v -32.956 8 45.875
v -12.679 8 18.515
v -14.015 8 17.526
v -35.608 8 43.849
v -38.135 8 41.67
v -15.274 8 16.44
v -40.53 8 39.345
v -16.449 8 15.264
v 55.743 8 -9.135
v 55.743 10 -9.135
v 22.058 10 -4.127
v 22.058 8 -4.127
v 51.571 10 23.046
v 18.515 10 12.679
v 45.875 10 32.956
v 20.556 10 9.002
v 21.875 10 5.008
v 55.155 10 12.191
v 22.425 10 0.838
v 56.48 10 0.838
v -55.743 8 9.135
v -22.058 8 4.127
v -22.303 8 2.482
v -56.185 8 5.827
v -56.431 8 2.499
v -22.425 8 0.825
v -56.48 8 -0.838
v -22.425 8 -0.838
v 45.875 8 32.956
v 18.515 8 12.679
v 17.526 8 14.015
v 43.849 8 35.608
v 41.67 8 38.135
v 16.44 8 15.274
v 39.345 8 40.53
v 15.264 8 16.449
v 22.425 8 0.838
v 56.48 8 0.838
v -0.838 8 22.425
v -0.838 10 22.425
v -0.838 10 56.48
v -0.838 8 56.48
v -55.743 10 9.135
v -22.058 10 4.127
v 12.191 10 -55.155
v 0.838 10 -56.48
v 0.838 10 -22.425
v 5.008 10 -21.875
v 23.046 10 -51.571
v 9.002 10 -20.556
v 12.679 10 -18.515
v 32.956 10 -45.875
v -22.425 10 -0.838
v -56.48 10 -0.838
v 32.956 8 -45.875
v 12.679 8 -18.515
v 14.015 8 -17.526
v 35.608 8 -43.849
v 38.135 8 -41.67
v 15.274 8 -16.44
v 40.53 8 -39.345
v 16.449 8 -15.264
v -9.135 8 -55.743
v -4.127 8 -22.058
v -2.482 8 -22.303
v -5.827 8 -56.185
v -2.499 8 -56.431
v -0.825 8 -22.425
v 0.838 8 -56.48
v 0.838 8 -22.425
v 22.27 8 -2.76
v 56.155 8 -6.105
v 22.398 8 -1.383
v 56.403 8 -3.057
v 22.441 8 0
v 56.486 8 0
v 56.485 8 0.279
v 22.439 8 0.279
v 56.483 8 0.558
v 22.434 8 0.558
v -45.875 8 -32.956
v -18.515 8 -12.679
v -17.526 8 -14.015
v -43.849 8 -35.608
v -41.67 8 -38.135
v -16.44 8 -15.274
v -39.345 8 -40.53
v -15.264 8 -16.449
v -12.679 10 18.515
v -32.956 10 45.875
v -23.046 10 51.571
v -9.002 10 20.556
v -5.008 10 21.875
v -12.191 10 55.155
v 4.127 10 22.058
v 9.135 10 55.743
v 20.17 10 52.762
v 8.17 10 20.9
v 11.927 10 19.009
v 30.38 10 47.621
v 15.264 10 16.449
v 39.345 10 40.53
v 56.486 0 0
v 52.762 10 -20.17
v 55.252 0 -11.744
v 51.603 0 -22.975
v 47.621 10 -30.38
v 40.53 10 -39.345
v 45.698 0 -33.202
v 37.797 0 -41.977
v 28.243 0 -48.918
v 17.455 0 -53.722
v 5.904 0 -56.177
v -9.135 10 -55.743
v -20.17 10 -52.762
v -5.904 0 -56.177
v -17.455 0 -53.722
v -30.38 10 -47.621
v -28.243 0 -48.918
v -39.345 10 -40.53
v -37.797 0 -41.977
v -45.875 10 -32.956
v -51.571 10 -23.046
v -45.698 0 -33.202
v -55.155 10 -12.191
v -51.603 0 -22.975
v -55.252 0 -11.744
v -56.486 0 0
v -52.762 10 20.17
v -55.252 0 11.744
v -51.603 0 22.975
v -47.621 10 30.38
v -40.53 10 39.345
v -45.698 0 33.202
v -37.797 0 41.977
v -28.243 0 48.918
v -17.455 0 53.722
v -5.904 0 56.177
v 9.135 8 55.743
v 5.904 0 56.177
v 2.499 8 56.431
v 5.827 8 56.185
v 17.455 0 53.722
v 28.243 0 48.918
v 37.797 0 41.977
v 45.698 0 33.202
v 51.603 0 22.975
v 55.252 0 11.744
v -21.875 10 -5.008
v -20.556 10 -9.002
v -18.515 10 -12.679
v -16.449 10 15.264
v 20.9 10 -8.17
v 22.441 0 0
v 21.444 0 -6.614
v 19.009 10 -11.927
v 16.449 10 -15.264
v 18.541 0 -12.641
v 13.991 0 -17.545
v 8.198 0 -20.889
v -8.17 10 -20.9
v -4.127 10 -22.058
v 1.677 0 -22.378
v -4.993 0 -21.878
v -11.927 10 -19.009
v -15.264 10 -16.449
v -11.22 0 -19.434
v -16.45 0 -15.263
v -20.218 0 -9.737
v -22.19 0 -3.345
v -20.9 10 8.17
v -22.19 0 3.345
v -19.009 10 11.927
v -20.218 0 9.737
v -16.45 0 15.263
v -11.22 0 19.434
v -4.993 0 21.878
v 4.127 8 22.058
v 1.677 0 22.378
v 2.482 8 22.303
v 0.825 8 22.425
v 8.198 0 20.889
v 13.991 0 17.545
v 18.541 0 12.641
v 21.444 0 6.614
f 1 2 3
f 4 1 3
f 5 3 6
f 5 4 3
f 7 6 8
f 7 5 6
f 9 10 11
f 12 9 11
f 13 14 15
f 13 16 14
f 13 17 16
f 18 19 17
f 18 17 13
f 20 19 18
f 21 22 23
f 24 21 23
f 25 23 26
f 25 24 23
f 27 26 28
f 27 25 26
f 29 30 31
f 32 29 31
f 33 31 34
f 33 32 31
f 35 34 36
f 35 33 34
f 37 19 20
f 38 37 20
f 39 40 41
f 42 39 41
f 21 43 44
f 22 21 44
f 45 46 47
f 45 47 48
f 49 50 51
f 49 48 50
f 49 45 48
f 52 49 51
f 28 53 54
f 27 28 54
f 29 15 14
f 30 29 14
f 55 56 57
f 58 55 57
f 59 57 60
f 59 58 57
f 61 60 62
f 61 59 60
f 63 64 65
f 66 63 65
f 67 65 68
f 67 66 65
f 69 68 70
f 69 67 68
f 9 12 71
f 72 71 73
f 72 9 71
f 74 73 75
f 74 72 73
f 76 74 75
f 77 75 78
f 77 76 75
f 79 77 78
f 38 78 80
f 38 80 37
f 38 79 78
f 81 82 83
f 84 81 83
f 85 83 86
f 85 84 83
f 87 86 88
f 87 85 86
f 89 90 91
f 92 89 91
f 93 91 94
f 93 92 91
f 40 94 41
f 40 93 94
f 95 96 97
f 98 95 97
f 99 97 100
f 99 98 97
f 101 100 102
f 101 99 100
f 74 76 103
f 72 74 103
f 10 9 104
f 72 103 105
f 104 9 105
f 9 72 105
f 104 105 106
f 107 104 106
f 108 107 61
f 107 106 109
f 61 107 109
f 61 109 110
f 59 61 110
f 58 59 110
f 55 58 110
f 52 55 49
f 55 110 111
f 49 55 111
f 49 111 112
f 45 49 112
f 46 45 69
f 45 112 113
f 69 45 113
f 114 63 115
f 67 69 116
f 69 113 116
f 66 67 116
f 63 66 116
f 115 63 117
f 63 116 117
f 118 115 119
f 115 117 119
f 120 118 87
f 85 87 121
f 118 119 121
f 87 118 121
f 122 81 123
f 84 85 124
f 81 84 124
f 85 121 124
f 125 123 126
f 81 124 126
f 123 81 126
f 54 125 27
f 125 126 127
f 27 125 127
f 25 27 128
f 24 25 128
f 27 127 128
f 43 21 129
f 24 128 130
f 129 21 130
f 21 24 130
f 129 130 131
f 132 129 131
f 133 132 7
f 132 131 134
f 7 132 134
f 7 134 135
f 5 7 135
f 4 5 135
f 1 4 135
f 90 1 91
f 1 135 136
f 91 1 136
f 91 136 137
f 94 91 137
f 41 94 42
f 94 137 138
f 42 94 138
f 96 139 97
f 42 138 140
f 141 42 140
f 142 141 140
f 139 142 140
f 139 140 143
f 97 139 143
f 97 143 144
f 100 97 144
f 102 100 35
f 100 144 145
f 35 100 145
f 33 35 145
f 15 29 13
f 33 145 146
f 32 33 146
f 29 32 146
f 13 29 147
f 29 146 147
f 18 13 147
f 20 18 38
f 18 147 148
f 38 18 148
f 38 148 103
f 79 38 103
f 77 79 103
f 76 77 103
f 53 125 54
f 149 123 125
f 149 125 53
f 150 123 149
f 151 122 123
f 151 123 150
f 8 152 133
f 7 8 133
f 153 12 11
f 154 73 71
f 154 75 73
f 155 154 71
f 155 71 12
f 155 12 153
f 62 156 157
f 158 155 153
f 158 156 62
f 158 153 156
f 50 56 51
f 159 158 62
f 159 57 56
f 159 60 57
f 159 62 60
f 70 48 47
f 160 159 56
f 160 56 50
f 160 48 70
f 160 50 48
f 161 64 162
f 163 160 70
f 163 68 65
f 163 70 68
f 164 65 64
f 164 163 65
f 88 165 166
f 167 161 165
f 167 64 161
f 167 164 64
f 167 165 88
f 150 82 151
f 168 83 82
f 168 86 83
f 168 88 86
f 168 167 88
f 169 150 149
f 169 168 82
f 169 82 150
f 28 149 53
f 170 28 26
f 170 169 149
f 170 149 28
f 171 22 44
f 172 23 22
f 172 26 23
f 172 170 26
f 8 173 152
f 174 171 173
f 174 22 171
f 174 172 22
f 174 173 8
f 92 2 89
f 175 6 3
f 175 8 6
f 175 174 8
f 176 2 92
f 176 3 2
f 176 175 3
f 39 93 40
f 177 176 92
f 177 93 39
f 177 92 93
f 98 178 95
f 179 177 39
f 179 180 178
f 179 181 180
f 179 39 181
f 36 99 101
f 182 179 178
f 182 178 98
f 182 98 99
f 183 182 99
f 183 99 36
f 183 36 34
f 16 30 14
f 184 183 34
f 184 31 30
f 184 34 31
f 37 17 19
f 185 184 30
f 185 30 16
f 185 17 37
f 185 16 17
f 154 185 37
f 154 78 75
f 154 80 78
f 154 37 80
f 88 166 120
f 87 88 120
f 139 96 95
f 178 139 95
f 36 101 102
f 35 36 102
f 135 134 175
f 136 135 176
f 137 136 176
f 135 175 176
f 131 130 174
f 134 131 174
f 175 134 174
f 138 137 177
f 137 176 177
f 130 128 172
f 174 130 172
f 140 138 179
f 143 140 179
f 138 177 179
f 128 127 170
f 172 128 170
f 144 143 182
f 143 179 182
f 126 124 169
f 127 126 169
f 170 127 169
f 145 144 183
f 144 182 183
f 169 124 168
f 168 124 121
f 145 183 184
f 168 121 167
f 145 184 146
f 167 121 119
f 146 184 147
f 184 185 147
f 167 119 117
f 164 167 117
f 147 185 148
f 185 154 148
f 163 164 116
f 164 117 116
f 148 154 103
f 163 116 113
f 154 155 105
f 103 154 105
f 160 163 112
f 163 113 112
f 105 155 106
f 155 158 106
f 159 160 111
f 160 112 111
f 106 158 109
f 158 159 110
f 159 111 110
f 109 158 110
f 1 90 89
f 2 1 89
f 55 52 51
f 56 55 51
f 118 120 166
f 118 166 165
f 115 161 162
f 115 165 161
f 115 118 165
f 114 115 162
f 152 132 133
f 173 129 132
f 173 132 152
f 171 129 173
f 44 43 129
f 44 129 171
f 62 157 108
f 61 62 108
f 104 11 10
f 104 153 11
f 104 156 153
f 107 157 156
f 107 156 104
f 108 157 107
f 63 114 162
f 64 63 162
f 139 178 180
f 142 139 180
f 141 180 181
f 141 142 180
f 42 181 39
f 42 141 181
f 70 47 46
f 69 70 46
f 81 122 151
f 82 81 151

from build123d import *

# Parameters (mm, degrees)
SKETCH1_R           = 56.486183981
SKETCH1_R_2         = 22.440533472
BOSS_EXTRUDE1_DEPTH = 10
CUT_EXTRUDE1_DEPTH  = 2
CIRPATTERN1_COUNT   = 8


with BuildPart() as part:
    # Sketch1 → Boss-Extrude1 (new body)
    with BuildSketch(Plane(origin=(0, 0, 0), x_dir=(1, 0, 0), z_dir=(0, 1, 0))):
        Circle(SKETCH1_R)
        Circle(SKETCH1_R_2, mode=Mode.SUBTRACT)
    extrude(amount=BOSS_EXTRUDE1_DEPTH)

    # Sketch2 → Cut-Extrude1 (cut)
    with BuildSketch(Plane(origin=(0, 10, 0), x_dir=(1, 0, 0), z_dir=(0, 1, 0))):
        with BuildLine():
            Line((-9.135137375, 55.742607096), (-1.420081042, 3.855253414))
            ThreePointArc((-1.420081042, 3.855253414), (-0.302945279, 4.097295841), (0.837640155, 4.022184484))
            Line((0.837640155, 4.022184484), (0.837640155, 56.479972908))
            ThreePointArc((0.837640155, 56.479972908), (-4.165098092, 56.332414635), (-9.135137375, 55.742607096))
        make_face()
    cut_extrude1 = extrude(amount=-CUT_EXTRUDE1_DEPTH, mode=Mode.SUBTRACT)

    # CirPattern1: Cut-Extrude1 ×8 about axis
    cirpattern1_axis = Axis((0, 0, 0), (0, 1, 0))
    for i in range(1, CIRPATTERN1_COUNT):
        add(cut_extrude1.rotate(cirpattern1_axis, i * 360 / CIRPATTERN1_COUNT), mode=Mode.SUBTRACT)


solid = part.part
